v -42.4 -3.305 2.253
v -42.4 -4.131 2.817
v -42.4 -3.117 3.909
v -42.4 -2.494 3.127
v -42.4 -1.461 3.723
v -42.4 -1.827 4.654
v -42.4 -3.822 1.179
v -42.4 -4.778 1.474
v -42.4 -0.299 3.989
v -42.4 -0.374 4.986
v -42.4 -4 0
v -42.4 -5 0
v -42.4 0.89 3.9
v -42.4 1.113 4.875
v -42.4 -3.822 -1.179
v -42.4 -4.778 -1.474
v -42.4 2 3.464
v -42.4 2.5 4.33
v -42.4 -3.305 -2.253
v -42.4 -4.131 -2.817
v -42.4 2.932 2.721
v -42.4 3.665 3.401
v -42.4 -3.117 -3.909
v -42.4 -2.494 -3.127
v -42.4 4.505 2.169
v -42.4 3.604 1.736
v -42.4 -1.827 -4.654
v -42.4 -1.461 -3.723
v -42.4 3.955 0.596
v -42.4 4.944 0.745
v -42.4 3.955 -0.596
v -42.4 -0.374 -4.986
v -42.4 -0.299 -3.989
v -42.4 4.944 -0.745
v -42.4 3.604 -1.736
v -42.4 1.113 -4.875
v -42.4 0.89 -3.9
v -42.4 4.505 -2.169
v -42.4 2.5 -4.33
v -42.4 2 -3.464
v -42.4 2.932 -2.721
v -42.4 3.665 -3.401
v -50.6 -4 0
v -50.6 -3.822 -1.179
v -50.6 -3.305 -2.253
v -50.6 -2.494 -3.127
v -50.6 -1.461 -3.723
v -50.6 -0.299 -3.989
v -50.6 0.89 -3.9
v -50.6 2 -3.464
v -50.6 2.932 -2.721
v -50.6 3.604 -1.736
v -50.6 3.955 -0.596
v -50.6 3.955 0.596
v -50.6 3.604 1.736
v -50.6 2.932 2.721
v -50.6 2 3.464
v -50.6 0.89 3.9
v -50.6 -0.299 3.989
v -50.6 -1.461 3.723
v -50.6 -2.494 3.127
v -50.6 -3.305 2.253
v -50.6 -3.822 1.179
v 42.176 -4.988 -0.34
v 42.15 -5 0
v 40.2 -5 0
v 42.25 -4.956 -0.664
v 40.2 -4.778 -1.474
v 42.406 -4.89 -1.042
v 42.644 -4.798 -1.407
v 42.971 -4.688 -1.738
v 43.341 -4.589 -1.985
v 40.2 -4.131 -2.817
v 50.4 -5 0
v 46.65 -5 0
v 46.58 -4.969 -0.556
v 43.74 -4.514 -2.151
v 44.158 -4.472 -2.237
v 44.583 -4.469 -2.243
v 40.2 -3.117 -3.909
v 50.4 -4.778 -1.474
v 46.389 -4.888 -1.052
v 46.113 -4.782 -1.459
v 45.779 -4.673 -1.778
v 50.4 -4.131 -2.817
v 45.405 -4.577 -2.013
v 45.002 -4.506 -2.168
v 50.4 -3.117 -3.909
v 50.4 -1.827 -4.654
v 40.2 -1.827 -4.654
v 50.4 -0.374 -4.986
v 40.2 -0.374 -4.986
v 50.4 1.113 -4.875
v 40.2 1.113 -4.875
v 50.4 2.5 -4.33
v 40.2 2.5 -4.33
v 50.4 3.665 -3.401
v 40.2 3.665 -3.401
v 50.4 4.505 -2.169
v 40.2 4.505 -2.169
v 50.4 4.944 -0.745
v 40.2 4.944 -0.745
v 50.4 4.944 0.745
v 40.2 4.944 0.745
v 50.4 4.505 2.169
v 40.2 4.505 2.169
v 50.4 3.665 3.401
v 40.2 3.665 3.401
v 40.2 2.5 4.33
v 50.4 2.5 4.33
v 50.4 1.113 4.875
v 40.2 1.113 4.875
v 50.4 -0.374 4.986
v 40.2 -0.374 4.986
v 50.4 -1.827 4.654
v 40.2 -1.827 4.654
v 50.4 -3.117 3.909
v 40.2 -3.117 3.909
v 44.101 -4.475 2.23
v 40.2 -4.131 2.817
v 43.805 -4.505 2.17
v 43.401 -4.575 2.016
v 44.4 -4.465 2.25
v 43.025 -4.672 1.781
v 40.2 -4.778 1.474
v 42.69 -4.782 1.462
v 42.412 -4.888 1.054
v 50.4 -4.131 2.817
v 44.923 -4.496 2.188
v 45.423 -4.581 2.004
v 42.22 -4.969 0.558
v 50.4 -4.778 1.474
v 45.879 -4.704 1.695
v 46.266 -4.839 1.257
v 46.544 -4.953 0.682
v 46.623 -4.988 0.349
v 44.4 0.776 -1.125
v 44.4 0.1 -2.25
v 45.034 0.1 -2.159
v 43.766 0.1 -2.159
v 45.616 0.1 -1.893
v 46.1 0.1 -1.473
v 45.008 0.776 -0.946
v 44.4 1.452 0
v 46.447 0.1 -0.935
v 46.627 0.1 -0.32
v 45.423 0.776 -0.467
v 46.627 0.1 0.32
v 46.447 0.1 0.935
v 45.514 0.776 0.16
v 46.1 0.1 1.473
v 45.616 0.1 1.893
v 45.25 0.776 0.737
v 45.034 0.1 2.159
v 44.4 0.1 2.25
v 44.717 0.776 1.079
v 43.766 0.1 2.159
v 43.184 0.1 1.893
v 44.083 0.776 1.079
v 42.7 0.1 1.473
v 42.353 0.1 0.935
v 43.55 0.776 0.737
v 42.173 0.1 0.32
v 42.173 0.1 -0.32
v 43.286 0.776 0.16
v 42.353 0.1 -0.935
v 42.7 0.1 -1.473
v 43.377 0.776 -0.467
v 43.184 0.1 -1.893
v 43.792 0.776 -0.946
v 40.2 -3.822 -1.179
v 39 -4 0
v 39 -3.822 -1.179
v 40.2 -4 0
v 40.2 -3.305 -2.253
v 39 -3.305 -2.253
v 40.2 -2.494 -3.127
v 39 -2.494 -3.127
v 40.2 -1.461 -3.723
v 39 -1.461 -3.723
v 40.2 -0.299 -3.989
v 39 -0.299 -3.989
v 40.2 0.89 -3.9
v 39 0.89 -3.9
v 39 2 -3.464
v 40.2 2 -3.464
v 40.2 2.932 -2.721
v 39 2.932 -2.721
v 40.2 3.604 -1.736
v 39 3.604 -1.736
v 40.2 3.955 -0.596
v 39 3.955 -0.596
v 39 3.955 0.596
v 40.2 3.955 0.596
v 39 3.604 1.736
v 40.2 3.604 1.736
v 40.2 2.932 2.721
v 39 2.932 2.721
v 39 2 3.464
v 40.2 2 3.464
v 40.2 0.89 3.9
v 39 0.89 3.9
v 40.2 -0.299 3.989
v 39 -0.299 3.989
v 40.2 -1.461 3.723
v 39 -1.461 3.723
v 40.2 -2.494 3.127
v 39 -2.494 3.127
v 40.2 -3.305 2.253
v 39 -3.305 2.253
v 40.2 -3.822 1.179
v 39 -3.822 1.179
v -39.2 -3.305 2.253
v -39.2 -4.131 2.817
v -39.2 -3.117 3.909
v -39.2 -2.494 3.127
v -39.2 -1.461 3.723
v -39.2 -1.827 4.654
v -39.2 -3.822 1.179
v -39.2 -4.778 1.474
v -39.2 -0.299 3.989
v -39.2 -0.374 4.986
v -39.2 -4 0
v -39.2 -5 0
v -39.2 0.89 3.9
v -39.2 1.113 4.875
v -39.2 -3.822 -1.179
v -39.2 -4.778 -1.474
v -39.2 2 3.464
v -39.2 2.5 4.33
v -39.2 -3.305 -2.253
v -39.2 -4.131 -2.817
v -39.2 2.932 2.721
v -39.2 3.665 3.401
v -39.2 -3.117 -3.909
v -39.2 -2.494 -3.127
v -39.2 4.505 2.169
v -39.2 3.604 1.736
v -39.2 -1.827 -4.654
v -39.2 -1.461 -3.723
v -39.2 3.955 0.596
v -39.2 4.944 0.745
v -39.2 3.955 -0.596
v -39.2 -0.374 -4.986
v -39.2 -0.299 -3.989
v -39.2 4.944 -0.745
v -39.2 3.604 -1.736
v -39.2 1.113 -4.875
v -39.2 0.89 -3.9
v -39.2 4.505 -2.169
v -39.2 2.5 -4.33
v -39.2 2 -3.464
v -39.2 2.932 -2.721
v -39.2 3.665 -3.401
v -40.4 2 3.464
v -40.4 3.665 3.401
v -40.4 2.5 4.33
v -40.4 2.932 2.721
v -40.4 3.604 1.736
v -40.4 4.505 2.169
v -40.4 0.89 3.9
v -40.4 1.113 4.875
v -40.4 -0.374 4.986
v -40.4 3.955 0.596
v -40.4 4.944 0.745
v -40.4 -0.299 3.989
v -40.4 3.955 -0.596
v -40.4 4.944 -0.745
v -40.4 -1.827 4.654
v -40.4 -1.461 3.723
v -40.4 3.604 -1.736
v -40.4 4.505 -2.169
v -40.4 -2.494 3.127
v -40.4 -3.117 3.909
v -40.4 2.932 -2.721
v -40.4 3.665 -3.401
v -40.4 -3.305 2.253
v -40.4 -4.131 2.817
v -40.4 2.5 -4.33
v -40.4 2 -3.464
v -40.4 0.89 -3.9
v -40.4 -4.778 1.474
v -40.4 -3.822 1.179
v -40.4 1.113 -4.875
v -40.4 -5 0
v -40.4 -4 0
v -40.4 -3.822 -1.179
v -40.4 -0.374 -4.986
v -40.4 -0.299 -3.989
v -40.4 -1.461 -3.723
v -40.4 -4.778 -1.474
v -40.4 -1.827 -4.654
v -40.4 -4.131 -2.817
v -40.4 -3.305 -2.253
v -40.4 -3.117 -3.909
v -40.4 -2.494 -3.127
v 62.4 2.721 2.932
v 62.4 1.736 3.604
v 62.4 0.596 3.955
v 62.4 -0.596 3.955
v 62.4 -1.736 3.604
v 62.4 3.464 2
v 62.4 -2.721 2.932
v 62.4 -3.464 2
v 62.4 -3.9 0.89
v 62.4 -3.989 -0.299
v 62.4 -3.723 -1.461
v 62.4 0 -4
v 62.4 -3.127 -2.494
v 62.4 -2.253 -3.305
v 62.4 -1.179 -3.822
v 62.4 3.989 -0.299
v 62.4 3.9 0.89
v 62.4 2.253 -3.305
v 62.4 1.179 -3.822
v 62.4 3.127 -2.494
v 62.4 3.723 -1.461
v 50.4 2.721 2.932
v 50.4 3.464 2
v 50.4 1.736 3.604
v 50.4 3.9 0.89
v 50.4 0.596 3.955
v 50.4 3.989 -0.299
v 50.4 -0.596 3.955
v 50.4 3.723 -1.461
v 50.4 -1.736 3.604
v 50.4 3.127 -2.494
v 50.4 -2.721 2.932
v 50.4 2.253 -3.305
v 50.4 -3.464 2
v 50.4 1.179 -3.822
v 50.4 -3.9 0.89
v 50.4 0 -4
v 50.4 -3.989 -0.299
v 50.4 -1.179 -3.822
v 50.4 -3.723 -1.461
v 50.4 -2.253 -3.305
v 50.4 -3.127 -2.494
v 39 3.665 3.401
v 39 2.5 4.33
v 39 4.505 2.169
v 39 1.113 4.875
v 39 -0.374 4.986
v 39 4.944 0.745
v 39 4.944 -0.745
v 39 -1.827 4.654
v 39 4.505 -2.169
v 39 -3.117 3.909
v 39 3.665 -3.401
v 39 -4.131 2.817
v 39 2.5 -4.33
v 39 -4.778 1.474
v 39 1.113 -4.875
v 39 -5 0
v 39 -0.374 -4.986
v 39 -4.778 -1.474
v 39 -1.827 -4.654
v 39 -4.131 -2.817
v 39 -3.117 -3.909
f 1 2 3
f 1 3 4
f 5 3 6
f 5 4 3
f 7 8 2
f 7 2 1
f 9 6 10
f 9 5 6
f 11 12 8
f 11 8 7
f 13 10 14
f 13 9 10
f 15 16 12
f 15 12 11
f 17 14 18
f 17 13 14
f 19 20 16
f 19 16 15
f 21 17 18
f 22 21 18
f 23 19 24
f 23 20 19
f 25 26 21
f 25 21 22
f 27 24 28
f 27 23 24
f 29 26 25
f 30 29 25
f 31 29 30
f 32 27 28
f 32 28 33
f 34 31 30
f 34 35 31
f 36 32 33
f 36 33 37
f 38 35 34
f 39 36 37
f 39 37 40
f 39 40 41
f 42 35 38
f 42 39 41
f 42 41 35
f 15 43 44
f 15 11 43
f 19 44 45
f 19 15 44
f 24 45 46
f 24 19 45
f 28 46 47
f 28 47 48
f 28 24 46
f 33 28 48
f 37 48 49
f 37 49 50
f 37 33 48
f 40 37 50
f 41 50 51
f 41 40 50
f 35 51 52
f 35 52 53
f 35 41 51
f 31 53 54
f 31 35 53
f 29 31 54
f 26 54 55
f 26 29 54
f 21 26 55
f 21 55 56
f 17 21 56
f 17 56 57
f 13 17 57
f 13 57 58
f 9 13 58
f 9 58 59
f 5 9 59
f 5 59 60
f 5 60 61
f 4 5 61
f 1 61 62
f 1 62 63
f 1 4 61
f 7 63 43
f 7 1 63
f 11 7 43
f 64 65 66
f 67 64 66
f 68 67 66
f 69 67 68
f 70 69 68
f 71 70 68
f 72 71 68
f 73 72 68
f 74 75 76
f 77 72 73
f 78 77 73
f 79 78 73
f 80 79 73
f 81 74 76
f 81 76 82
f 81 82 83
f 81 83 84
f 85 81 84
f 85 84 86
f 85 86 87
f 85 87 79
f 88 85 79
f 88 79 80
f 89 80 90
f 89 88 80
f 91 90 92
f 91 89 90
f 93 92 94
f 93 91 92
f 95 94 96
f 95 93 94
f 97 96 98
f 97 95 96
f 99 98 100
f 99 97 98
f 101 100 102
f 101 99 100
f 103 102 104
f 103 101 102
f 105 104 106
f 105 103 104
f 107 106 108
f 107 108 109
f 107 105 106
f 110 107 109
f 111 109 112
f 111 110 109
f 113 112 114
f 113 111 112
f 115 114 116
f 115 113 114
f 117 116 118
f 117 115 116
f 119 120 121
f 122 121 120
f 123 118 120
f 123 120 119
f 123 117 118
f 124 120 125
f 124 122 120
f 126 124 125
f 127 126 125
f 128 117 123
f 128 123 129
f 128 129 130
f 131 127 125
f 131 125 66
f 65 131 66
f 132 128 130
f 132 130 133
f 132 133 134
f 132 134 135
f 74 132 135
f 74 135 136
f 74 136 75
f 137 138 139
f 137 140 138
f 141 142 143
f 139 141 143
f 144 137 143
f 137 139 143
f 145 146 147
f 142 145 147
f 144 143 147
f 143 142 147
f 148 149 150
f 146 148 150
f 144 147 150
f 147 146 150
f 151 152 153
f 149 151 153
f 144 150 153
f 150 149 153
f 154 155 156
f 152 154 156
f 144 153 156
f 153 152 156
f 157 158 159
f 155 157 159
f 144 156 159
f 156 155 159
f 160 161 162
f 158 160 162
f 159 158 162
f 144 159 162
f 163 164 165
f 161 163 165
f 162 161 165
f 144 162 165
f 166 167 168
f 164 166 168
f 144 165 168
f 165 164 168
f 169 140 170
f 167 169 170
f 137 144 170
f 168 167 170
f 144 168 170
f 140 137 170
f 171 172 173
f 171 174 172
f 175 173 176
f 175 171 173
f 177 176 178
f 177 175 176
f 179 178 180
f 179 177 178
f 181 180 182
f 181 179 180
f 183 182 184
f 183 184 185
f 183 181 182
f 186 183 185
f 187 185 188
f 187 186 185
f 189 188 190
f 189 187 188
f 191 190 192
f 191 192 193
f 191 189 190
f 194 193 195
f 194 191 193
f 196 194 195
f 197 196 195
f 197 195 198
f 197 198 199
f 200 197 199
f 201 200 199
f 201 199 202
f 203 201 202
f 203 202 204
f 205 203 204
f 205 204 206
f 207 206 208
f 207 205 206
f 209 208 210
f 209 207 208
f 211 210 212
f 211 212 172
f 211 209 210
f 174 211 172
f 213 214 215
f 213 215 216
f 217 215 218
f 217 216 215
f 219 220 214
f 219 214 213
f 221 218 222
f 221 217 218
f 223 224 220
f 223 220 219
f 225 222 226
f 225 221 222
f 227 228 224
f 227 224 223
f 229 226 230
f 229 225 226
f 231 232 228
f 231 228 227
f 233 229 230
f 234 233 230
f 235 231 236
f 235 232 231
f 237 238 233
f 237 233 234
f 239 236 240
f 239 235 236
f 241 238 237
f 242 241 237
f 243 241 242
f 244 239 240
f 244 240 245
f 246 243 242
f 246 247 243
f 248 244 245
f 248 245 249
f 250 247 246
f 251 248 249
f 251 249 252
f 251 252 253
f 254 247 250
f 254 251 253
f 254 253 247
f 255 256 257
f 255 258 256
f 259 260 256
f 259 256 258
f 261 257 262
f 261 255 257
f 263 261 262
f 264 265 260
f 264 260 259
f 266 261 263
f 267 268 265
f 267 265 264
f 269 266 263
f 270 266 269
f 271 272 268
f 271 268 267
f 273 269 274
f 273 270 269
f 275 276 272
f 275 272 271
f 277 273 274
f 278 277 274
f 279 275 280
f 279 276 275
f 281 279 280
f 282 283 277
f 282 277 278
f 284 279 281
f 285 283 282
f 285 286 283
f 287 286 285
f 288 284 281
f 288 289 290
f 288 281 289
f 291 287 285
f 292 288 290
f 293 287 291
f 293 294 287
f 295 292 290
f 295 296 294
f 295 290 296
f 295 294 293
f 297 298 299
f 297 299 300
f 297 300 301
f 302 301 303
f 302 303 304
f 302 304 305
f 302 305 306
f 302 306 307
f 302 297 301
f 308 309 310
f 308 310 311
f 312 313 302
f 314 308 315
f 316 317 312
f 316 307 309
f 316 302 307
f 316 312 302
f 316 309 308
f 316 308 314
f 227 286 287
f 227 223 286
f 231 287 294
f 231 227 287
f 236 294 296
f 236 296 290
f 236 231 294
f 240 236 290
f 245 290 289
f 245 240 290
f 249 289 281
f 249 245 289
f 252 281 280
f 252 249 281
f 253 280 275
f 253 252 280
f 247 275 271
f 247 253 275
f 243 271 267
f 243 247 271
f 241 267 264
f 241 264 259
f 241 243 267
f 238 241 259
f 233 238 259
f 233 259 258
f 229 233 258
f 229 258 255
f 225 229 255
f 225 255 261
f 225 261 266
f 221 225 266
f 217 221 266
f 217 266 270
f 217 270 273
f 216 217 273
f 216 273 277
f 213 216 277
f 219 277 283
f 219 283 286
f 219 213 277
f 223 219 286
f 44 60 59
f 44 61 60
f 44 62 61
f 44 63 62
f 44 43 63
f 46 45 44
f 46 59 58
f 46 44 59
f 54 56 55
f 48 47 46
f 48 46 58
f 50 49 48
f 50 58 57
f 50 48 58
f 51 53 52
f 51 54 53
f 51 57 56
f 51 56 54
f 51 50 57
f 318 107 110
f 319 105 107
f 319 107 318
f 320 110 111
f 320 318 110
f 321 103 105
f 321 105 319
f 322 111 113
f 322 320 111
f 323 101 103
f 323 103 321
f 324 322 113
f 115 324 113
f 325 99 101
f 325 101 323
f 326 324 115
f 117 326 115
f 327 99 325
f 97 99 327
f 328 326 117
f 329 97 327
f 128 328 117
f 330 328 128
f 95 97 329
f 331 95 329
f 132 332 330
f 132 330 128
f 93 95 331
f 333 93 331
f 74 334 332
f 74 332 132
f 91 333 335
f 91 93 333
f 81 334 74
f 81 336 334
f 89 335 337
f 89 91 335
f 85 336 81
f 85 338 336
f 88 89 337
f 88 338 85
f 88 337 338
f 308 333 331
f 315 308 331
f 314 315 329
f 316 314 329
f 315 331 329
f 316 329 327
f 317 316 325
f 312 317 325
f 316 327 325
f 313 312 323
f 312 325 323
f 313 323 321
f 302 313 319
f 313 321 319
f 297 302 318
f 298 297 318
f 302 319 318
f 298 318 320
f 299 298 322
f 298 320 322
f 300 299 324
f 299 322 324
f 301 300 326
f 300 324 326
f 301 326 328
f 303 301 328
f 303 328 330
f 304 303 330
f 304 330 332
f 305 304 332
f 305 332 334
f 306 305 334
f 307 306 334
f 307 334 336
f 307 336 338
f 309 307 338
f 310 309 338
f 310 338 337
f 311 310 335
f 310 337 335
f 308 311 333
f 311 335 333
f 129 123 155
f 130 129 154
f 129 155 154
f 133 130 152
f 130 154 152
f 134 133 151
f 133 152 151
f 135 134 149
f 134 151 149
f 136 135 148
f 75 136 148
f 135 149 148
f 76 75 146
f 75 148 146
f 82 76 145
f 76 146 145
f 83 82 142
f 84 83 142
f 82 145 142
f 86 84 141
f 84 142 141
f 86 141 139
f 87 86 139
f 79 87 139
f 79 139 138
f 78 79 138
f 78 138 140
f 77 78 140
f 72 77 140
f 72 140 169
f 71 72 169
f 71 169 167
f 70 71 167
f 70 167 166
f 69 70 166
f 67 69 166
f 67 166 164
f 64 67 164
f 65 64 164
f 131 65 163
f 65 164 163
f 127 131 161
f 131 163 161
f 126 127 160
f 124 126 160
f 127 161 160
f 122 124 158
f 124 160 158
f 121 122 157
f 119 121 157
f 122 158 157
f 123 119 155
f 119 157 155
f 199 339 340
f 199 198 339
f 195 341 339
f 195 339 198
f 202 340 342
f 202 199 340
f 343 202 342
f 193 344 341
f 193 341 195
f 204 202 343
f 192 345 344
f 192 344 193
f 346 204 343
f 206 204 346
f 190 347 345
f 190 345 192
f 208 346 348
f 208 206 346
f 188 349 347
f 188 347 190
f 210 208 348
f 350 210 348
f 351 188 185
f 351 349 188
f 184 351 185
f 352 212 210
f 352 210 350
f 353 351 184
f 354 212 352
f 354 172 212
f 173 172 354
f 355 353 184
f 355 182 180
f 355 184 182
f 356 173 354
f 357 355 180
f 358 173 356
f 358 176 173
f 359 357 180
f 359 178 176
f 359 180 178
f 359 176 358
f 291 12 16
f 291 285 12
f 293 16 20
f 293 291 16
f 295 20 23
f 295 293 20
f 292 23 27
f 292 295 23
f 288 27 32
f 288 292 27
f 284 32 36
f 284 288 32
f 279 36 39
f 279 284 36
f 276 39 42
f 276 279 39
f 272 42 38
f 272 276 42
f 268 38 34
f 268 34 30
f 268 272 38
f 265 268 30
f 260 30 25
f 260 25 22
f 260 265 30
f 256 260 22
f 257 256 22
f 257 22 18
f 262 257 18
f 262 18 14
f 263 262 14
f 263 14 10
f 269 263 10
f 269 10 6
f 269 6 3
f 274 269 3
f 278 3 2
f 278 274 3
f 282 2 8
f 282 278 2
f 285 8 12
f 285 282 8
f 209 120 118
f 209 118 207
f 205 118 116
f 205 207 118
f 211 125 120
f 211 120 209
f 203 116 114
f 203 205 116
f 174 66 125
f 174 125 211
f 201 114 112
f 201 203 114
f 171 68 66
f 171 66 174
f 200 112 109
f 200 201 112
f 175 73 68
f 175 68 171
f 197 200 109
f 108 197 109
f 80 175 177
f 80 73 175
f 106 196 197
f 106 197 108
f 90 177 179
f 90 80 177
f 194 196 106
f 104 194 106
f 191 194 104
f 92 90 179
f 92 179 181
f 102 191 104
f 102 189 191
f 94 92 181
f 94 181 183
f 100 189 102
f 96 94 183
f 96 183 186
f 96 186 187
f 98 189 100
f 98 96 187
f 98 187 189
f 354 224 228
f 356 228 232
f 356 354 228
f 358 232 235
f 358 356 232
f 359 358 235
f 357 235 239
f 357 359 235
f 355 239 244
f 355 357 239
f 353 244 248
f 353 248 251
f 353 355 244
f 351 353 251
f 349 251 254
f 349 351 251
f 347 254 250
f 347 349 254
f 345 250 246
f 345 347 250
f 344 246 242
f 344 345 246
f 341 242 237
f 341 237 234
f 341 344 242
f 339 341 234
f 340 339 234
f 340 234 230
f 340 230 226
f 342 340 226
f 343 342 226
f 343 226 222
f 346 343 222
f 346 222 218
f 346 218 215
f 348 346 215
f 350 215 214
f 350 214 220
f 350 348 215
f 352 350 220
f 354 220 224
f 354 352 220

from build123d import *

# Parameters (mm, degrees)
M4_CLEARANCE_HOLE5_D     = 4.5
M4_CLEARANCE_HOLE5_DEPTH = 5.1
M4_CLEARANCE_HOLE5_TIP   = 1.351936393
SKETCH17_R               = 4
BOSS_EXTRUDE1_DEPTH      = 12


with BuildPart() as part:
    # Sketch1 → Revolve1 (revolve)
    with BuildSketch(Plane.XY):
        Polygon((-39.2, -5), (39, -5), (39, -4), (40.2, -4), (40.2, -5), (50.4, -5), (50.4, 0), (-50.6, 0), (-50.6, -4), (-42.4, -4), (-42.4, -5), (-40.4, -5), (-40.4, -4), (-39.2, -4), align=None)
    revolve(axis=Axis((0, 0, 0), (1, 0, 0)))

    # M4 Clearance Hole5
    with Locations(Plane(origin=(44.4, -5, 0), x_dir=(0, 0, -1), z_dir=(0, -1, 0))):
        with Locations((0, 0)):
            Hole(M4_CLEARANCE_HOLE5_D / 2, depth=M4_CLEARANCE_HOLE5_DEPTH)
            with Locations((0, 0, -(M4_CLEARANCE_HOLE5_DEPTH + M4_CLEARANCE_HOLE5_TIP / 2))):  # 118° drill point
                Cone(0, M4_CLEARANCE_HOLE5_D / 2, M4_CLEARANCE_HOLE5_TIP, mode=Mode.SUBTRACT)

    # Sketch17 → Boss-Extrude1 (add)
    with BuildSketch(Plane(origin=(50.4, 0, 0), x_dir=(0, 0, -1), z_dir=(1, 0, 0))):
        Circle(SKETCH17_R)
    extrude(amount=BOSS_EXTRUDE1_DEPTH)


solid = part.part
